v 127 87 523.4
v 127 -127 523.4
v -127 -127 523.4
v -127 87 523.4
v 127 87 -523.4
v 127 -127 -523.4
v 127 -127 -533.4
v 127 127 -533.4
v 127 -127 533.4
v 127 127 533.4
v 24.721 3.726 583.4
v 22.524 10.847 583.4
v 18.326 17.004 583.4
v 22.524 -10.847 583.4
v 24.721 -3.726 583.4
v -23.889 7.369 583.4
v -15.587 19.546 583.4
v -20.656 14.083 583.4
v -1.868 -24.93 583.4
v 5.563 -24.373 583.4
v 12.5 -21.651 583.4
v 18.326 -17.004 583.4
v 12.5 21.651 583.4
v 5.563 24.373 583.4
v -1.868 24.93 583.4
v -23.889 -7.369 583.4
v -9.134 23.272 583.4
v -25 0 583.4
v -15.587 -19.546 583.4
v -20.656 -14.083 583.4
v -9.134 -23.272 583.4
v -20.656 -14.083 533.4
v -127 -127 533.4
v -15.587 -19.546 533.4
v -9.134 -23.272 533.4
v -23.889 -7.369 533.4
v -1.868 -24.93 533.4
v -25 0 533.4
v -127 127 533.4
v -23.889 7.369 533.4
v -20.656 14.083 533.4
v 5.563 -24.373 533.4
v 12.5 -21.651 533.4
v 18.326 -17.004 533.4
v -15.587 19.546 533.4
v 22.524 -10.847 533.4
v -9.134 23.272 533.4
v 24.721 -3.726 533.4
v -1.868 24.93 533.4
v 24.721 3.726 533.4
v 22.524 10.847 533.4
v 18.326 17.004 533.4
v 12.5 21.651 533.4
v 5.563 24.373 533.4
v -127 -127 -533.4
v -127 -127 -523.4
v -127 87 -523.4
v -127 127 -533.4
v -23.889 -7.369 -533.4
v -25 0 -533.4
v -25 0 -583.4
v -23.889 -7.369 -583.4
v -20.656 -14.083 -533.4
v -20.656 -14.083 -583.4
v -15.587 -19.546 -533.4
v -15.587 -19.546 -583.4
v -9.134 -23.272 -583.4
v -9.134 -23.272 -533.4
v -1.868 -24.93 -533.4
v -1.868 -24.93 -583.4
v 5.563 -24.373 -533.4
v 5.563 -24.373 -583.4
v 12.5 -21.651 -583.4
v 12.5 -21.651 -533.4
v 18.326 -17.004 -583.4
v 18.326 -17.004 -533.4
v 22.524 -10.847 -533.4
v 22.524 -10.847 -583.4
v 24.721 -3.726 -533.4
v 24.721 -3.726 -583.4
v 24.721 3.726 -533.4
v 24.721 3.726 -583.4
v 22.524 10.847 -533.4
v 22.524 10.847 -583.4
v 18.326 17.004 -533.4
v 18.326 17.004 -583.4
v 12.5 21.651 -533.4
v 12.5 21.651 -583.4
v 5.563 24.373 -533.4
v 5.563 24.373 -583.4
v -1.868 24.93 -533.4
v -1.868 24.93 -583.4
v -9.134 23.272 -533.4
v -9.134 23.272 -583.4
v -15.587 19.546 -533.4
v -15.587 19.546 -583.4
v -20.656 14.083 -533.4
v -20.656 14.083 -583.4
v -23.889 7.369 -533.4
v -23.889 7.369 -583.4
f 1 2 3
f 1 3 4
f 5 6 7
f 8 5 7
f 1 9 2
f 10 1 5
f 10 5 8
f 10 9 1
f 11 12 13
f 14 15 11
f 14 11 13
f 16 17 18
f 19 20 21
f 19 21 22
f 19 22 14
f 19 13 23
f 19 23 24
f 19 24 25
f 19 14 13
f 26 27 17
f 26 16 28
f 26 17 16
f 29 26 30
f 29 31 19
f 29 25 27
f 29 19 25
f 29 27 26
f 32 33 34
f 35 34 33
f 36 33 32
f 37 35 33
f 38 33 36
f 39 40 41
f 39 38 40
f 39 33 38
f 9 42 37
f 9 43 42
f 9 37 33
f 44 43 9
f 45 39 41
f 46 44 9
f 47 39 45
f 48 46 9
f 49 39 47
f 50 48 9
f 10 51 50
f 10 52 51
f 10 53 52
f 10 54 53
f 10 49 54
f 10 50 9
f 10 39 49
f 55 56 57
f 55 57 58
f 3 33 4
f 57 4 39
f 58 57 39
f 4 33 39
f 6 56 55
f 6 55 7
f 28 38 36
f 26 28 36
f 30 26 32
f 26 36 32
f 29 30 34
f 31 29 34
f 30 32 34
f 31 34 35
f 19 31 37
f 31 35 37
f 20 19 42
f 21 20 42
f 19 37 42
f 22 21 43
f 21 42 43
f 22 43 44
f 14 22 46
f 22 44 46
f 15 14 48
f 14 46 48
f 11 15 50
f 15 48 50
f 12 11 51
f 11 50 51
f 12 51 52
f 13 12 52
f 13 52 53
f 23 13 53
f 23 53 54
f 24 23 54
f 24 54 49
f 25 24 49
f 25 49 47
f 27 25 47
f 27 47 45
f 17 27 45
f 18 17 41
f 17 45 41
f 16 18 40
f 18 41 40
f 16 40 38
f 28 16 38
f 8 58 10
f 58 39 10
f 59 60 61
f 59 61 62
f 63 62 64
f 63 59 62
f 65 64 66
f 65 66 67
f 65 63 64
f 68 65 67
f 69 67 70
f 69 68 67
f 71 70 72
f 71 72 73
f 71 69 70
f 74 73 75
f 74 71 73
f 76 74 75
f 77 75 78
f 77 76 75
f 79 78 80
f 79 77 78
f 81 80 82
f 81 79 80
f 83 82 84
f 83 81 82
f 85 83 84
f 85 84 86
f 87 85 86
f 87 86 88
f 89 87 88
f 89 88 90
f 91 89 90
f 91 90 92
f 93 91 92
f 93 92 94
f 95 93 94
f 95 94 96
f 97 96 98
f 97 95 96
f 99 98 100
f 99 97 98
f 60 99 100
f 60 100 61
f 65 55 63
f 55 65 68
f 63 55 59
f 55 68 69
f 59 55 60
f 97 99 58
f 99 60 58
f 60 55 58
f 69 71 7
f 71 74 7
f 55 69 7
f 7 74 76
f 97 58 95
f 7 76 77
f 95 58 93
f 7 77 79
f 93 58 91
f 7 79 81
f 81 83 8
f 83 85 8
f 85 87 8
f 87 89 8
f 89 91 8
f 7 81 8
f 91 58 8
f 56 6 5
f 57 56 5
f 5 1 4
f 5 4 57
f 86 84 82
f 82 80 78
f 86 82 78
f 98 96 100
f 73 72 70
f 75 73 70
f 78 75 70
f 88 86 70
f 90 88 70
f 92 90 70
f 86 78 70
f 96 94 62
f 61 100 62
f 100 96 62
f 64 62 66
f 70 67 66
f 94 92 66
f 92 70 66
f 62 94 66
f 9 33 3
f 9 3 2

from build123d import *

# Parameters (mm, degrees)
SKETCH1_W           = 254
SKETCH1_H           = 254
BOSS_EXTRUDE1_DEPTH = 533.4
SKETCH2_R           = 25
BOSS_EXTRUDE2_DEPTH = 50
SKETCH3_W           = 1046.8
SKETCH3_H           = 267.639830062
CUT_EXTRUDE1_DEPTH  = 254


with BuildPart() as part:
    # Sketch1 → Boss-Extrude1 (new, symmetric)
    with BuildSketch(Plane.XY):
        Rectangle(SKETCH1_W, SKETCH1_H)
    extrude(amount=BOSS_EXTRUDE1_DEPTH, both=True)

    # Sketch2 → Boss-Extrude2 (add)
    with BuildSketch(Plane.XY.offset(533.4)):
        with Locations(Location((0, 0, 0), (0, 0, 180))):
            Circle(SKETCH2_R)
    boss_extrude2 = extrude(amount=BOSS_EXTRUDE2_DEPTH)

    # Mirror1: Boss-Extrude2 across plane
    add(boss_extrude2.mirror(Plane.XY))

    # Sketch3 → Cut-Extrude1 (cut)
    with BuildSketch(Plane(origin=(127, 0, 0), x_dir=(0, 0, -1), z_dir=(1, 0, 0))):
        with Locations((0, -46.819915031)):
            Rectangle(SKETCH3_W, SKETCH3_H)
    extrude(amount=-CUT_EXTRUDE1_DEPTH, mode=Mode.SUBTRACT)


solid = part.part
